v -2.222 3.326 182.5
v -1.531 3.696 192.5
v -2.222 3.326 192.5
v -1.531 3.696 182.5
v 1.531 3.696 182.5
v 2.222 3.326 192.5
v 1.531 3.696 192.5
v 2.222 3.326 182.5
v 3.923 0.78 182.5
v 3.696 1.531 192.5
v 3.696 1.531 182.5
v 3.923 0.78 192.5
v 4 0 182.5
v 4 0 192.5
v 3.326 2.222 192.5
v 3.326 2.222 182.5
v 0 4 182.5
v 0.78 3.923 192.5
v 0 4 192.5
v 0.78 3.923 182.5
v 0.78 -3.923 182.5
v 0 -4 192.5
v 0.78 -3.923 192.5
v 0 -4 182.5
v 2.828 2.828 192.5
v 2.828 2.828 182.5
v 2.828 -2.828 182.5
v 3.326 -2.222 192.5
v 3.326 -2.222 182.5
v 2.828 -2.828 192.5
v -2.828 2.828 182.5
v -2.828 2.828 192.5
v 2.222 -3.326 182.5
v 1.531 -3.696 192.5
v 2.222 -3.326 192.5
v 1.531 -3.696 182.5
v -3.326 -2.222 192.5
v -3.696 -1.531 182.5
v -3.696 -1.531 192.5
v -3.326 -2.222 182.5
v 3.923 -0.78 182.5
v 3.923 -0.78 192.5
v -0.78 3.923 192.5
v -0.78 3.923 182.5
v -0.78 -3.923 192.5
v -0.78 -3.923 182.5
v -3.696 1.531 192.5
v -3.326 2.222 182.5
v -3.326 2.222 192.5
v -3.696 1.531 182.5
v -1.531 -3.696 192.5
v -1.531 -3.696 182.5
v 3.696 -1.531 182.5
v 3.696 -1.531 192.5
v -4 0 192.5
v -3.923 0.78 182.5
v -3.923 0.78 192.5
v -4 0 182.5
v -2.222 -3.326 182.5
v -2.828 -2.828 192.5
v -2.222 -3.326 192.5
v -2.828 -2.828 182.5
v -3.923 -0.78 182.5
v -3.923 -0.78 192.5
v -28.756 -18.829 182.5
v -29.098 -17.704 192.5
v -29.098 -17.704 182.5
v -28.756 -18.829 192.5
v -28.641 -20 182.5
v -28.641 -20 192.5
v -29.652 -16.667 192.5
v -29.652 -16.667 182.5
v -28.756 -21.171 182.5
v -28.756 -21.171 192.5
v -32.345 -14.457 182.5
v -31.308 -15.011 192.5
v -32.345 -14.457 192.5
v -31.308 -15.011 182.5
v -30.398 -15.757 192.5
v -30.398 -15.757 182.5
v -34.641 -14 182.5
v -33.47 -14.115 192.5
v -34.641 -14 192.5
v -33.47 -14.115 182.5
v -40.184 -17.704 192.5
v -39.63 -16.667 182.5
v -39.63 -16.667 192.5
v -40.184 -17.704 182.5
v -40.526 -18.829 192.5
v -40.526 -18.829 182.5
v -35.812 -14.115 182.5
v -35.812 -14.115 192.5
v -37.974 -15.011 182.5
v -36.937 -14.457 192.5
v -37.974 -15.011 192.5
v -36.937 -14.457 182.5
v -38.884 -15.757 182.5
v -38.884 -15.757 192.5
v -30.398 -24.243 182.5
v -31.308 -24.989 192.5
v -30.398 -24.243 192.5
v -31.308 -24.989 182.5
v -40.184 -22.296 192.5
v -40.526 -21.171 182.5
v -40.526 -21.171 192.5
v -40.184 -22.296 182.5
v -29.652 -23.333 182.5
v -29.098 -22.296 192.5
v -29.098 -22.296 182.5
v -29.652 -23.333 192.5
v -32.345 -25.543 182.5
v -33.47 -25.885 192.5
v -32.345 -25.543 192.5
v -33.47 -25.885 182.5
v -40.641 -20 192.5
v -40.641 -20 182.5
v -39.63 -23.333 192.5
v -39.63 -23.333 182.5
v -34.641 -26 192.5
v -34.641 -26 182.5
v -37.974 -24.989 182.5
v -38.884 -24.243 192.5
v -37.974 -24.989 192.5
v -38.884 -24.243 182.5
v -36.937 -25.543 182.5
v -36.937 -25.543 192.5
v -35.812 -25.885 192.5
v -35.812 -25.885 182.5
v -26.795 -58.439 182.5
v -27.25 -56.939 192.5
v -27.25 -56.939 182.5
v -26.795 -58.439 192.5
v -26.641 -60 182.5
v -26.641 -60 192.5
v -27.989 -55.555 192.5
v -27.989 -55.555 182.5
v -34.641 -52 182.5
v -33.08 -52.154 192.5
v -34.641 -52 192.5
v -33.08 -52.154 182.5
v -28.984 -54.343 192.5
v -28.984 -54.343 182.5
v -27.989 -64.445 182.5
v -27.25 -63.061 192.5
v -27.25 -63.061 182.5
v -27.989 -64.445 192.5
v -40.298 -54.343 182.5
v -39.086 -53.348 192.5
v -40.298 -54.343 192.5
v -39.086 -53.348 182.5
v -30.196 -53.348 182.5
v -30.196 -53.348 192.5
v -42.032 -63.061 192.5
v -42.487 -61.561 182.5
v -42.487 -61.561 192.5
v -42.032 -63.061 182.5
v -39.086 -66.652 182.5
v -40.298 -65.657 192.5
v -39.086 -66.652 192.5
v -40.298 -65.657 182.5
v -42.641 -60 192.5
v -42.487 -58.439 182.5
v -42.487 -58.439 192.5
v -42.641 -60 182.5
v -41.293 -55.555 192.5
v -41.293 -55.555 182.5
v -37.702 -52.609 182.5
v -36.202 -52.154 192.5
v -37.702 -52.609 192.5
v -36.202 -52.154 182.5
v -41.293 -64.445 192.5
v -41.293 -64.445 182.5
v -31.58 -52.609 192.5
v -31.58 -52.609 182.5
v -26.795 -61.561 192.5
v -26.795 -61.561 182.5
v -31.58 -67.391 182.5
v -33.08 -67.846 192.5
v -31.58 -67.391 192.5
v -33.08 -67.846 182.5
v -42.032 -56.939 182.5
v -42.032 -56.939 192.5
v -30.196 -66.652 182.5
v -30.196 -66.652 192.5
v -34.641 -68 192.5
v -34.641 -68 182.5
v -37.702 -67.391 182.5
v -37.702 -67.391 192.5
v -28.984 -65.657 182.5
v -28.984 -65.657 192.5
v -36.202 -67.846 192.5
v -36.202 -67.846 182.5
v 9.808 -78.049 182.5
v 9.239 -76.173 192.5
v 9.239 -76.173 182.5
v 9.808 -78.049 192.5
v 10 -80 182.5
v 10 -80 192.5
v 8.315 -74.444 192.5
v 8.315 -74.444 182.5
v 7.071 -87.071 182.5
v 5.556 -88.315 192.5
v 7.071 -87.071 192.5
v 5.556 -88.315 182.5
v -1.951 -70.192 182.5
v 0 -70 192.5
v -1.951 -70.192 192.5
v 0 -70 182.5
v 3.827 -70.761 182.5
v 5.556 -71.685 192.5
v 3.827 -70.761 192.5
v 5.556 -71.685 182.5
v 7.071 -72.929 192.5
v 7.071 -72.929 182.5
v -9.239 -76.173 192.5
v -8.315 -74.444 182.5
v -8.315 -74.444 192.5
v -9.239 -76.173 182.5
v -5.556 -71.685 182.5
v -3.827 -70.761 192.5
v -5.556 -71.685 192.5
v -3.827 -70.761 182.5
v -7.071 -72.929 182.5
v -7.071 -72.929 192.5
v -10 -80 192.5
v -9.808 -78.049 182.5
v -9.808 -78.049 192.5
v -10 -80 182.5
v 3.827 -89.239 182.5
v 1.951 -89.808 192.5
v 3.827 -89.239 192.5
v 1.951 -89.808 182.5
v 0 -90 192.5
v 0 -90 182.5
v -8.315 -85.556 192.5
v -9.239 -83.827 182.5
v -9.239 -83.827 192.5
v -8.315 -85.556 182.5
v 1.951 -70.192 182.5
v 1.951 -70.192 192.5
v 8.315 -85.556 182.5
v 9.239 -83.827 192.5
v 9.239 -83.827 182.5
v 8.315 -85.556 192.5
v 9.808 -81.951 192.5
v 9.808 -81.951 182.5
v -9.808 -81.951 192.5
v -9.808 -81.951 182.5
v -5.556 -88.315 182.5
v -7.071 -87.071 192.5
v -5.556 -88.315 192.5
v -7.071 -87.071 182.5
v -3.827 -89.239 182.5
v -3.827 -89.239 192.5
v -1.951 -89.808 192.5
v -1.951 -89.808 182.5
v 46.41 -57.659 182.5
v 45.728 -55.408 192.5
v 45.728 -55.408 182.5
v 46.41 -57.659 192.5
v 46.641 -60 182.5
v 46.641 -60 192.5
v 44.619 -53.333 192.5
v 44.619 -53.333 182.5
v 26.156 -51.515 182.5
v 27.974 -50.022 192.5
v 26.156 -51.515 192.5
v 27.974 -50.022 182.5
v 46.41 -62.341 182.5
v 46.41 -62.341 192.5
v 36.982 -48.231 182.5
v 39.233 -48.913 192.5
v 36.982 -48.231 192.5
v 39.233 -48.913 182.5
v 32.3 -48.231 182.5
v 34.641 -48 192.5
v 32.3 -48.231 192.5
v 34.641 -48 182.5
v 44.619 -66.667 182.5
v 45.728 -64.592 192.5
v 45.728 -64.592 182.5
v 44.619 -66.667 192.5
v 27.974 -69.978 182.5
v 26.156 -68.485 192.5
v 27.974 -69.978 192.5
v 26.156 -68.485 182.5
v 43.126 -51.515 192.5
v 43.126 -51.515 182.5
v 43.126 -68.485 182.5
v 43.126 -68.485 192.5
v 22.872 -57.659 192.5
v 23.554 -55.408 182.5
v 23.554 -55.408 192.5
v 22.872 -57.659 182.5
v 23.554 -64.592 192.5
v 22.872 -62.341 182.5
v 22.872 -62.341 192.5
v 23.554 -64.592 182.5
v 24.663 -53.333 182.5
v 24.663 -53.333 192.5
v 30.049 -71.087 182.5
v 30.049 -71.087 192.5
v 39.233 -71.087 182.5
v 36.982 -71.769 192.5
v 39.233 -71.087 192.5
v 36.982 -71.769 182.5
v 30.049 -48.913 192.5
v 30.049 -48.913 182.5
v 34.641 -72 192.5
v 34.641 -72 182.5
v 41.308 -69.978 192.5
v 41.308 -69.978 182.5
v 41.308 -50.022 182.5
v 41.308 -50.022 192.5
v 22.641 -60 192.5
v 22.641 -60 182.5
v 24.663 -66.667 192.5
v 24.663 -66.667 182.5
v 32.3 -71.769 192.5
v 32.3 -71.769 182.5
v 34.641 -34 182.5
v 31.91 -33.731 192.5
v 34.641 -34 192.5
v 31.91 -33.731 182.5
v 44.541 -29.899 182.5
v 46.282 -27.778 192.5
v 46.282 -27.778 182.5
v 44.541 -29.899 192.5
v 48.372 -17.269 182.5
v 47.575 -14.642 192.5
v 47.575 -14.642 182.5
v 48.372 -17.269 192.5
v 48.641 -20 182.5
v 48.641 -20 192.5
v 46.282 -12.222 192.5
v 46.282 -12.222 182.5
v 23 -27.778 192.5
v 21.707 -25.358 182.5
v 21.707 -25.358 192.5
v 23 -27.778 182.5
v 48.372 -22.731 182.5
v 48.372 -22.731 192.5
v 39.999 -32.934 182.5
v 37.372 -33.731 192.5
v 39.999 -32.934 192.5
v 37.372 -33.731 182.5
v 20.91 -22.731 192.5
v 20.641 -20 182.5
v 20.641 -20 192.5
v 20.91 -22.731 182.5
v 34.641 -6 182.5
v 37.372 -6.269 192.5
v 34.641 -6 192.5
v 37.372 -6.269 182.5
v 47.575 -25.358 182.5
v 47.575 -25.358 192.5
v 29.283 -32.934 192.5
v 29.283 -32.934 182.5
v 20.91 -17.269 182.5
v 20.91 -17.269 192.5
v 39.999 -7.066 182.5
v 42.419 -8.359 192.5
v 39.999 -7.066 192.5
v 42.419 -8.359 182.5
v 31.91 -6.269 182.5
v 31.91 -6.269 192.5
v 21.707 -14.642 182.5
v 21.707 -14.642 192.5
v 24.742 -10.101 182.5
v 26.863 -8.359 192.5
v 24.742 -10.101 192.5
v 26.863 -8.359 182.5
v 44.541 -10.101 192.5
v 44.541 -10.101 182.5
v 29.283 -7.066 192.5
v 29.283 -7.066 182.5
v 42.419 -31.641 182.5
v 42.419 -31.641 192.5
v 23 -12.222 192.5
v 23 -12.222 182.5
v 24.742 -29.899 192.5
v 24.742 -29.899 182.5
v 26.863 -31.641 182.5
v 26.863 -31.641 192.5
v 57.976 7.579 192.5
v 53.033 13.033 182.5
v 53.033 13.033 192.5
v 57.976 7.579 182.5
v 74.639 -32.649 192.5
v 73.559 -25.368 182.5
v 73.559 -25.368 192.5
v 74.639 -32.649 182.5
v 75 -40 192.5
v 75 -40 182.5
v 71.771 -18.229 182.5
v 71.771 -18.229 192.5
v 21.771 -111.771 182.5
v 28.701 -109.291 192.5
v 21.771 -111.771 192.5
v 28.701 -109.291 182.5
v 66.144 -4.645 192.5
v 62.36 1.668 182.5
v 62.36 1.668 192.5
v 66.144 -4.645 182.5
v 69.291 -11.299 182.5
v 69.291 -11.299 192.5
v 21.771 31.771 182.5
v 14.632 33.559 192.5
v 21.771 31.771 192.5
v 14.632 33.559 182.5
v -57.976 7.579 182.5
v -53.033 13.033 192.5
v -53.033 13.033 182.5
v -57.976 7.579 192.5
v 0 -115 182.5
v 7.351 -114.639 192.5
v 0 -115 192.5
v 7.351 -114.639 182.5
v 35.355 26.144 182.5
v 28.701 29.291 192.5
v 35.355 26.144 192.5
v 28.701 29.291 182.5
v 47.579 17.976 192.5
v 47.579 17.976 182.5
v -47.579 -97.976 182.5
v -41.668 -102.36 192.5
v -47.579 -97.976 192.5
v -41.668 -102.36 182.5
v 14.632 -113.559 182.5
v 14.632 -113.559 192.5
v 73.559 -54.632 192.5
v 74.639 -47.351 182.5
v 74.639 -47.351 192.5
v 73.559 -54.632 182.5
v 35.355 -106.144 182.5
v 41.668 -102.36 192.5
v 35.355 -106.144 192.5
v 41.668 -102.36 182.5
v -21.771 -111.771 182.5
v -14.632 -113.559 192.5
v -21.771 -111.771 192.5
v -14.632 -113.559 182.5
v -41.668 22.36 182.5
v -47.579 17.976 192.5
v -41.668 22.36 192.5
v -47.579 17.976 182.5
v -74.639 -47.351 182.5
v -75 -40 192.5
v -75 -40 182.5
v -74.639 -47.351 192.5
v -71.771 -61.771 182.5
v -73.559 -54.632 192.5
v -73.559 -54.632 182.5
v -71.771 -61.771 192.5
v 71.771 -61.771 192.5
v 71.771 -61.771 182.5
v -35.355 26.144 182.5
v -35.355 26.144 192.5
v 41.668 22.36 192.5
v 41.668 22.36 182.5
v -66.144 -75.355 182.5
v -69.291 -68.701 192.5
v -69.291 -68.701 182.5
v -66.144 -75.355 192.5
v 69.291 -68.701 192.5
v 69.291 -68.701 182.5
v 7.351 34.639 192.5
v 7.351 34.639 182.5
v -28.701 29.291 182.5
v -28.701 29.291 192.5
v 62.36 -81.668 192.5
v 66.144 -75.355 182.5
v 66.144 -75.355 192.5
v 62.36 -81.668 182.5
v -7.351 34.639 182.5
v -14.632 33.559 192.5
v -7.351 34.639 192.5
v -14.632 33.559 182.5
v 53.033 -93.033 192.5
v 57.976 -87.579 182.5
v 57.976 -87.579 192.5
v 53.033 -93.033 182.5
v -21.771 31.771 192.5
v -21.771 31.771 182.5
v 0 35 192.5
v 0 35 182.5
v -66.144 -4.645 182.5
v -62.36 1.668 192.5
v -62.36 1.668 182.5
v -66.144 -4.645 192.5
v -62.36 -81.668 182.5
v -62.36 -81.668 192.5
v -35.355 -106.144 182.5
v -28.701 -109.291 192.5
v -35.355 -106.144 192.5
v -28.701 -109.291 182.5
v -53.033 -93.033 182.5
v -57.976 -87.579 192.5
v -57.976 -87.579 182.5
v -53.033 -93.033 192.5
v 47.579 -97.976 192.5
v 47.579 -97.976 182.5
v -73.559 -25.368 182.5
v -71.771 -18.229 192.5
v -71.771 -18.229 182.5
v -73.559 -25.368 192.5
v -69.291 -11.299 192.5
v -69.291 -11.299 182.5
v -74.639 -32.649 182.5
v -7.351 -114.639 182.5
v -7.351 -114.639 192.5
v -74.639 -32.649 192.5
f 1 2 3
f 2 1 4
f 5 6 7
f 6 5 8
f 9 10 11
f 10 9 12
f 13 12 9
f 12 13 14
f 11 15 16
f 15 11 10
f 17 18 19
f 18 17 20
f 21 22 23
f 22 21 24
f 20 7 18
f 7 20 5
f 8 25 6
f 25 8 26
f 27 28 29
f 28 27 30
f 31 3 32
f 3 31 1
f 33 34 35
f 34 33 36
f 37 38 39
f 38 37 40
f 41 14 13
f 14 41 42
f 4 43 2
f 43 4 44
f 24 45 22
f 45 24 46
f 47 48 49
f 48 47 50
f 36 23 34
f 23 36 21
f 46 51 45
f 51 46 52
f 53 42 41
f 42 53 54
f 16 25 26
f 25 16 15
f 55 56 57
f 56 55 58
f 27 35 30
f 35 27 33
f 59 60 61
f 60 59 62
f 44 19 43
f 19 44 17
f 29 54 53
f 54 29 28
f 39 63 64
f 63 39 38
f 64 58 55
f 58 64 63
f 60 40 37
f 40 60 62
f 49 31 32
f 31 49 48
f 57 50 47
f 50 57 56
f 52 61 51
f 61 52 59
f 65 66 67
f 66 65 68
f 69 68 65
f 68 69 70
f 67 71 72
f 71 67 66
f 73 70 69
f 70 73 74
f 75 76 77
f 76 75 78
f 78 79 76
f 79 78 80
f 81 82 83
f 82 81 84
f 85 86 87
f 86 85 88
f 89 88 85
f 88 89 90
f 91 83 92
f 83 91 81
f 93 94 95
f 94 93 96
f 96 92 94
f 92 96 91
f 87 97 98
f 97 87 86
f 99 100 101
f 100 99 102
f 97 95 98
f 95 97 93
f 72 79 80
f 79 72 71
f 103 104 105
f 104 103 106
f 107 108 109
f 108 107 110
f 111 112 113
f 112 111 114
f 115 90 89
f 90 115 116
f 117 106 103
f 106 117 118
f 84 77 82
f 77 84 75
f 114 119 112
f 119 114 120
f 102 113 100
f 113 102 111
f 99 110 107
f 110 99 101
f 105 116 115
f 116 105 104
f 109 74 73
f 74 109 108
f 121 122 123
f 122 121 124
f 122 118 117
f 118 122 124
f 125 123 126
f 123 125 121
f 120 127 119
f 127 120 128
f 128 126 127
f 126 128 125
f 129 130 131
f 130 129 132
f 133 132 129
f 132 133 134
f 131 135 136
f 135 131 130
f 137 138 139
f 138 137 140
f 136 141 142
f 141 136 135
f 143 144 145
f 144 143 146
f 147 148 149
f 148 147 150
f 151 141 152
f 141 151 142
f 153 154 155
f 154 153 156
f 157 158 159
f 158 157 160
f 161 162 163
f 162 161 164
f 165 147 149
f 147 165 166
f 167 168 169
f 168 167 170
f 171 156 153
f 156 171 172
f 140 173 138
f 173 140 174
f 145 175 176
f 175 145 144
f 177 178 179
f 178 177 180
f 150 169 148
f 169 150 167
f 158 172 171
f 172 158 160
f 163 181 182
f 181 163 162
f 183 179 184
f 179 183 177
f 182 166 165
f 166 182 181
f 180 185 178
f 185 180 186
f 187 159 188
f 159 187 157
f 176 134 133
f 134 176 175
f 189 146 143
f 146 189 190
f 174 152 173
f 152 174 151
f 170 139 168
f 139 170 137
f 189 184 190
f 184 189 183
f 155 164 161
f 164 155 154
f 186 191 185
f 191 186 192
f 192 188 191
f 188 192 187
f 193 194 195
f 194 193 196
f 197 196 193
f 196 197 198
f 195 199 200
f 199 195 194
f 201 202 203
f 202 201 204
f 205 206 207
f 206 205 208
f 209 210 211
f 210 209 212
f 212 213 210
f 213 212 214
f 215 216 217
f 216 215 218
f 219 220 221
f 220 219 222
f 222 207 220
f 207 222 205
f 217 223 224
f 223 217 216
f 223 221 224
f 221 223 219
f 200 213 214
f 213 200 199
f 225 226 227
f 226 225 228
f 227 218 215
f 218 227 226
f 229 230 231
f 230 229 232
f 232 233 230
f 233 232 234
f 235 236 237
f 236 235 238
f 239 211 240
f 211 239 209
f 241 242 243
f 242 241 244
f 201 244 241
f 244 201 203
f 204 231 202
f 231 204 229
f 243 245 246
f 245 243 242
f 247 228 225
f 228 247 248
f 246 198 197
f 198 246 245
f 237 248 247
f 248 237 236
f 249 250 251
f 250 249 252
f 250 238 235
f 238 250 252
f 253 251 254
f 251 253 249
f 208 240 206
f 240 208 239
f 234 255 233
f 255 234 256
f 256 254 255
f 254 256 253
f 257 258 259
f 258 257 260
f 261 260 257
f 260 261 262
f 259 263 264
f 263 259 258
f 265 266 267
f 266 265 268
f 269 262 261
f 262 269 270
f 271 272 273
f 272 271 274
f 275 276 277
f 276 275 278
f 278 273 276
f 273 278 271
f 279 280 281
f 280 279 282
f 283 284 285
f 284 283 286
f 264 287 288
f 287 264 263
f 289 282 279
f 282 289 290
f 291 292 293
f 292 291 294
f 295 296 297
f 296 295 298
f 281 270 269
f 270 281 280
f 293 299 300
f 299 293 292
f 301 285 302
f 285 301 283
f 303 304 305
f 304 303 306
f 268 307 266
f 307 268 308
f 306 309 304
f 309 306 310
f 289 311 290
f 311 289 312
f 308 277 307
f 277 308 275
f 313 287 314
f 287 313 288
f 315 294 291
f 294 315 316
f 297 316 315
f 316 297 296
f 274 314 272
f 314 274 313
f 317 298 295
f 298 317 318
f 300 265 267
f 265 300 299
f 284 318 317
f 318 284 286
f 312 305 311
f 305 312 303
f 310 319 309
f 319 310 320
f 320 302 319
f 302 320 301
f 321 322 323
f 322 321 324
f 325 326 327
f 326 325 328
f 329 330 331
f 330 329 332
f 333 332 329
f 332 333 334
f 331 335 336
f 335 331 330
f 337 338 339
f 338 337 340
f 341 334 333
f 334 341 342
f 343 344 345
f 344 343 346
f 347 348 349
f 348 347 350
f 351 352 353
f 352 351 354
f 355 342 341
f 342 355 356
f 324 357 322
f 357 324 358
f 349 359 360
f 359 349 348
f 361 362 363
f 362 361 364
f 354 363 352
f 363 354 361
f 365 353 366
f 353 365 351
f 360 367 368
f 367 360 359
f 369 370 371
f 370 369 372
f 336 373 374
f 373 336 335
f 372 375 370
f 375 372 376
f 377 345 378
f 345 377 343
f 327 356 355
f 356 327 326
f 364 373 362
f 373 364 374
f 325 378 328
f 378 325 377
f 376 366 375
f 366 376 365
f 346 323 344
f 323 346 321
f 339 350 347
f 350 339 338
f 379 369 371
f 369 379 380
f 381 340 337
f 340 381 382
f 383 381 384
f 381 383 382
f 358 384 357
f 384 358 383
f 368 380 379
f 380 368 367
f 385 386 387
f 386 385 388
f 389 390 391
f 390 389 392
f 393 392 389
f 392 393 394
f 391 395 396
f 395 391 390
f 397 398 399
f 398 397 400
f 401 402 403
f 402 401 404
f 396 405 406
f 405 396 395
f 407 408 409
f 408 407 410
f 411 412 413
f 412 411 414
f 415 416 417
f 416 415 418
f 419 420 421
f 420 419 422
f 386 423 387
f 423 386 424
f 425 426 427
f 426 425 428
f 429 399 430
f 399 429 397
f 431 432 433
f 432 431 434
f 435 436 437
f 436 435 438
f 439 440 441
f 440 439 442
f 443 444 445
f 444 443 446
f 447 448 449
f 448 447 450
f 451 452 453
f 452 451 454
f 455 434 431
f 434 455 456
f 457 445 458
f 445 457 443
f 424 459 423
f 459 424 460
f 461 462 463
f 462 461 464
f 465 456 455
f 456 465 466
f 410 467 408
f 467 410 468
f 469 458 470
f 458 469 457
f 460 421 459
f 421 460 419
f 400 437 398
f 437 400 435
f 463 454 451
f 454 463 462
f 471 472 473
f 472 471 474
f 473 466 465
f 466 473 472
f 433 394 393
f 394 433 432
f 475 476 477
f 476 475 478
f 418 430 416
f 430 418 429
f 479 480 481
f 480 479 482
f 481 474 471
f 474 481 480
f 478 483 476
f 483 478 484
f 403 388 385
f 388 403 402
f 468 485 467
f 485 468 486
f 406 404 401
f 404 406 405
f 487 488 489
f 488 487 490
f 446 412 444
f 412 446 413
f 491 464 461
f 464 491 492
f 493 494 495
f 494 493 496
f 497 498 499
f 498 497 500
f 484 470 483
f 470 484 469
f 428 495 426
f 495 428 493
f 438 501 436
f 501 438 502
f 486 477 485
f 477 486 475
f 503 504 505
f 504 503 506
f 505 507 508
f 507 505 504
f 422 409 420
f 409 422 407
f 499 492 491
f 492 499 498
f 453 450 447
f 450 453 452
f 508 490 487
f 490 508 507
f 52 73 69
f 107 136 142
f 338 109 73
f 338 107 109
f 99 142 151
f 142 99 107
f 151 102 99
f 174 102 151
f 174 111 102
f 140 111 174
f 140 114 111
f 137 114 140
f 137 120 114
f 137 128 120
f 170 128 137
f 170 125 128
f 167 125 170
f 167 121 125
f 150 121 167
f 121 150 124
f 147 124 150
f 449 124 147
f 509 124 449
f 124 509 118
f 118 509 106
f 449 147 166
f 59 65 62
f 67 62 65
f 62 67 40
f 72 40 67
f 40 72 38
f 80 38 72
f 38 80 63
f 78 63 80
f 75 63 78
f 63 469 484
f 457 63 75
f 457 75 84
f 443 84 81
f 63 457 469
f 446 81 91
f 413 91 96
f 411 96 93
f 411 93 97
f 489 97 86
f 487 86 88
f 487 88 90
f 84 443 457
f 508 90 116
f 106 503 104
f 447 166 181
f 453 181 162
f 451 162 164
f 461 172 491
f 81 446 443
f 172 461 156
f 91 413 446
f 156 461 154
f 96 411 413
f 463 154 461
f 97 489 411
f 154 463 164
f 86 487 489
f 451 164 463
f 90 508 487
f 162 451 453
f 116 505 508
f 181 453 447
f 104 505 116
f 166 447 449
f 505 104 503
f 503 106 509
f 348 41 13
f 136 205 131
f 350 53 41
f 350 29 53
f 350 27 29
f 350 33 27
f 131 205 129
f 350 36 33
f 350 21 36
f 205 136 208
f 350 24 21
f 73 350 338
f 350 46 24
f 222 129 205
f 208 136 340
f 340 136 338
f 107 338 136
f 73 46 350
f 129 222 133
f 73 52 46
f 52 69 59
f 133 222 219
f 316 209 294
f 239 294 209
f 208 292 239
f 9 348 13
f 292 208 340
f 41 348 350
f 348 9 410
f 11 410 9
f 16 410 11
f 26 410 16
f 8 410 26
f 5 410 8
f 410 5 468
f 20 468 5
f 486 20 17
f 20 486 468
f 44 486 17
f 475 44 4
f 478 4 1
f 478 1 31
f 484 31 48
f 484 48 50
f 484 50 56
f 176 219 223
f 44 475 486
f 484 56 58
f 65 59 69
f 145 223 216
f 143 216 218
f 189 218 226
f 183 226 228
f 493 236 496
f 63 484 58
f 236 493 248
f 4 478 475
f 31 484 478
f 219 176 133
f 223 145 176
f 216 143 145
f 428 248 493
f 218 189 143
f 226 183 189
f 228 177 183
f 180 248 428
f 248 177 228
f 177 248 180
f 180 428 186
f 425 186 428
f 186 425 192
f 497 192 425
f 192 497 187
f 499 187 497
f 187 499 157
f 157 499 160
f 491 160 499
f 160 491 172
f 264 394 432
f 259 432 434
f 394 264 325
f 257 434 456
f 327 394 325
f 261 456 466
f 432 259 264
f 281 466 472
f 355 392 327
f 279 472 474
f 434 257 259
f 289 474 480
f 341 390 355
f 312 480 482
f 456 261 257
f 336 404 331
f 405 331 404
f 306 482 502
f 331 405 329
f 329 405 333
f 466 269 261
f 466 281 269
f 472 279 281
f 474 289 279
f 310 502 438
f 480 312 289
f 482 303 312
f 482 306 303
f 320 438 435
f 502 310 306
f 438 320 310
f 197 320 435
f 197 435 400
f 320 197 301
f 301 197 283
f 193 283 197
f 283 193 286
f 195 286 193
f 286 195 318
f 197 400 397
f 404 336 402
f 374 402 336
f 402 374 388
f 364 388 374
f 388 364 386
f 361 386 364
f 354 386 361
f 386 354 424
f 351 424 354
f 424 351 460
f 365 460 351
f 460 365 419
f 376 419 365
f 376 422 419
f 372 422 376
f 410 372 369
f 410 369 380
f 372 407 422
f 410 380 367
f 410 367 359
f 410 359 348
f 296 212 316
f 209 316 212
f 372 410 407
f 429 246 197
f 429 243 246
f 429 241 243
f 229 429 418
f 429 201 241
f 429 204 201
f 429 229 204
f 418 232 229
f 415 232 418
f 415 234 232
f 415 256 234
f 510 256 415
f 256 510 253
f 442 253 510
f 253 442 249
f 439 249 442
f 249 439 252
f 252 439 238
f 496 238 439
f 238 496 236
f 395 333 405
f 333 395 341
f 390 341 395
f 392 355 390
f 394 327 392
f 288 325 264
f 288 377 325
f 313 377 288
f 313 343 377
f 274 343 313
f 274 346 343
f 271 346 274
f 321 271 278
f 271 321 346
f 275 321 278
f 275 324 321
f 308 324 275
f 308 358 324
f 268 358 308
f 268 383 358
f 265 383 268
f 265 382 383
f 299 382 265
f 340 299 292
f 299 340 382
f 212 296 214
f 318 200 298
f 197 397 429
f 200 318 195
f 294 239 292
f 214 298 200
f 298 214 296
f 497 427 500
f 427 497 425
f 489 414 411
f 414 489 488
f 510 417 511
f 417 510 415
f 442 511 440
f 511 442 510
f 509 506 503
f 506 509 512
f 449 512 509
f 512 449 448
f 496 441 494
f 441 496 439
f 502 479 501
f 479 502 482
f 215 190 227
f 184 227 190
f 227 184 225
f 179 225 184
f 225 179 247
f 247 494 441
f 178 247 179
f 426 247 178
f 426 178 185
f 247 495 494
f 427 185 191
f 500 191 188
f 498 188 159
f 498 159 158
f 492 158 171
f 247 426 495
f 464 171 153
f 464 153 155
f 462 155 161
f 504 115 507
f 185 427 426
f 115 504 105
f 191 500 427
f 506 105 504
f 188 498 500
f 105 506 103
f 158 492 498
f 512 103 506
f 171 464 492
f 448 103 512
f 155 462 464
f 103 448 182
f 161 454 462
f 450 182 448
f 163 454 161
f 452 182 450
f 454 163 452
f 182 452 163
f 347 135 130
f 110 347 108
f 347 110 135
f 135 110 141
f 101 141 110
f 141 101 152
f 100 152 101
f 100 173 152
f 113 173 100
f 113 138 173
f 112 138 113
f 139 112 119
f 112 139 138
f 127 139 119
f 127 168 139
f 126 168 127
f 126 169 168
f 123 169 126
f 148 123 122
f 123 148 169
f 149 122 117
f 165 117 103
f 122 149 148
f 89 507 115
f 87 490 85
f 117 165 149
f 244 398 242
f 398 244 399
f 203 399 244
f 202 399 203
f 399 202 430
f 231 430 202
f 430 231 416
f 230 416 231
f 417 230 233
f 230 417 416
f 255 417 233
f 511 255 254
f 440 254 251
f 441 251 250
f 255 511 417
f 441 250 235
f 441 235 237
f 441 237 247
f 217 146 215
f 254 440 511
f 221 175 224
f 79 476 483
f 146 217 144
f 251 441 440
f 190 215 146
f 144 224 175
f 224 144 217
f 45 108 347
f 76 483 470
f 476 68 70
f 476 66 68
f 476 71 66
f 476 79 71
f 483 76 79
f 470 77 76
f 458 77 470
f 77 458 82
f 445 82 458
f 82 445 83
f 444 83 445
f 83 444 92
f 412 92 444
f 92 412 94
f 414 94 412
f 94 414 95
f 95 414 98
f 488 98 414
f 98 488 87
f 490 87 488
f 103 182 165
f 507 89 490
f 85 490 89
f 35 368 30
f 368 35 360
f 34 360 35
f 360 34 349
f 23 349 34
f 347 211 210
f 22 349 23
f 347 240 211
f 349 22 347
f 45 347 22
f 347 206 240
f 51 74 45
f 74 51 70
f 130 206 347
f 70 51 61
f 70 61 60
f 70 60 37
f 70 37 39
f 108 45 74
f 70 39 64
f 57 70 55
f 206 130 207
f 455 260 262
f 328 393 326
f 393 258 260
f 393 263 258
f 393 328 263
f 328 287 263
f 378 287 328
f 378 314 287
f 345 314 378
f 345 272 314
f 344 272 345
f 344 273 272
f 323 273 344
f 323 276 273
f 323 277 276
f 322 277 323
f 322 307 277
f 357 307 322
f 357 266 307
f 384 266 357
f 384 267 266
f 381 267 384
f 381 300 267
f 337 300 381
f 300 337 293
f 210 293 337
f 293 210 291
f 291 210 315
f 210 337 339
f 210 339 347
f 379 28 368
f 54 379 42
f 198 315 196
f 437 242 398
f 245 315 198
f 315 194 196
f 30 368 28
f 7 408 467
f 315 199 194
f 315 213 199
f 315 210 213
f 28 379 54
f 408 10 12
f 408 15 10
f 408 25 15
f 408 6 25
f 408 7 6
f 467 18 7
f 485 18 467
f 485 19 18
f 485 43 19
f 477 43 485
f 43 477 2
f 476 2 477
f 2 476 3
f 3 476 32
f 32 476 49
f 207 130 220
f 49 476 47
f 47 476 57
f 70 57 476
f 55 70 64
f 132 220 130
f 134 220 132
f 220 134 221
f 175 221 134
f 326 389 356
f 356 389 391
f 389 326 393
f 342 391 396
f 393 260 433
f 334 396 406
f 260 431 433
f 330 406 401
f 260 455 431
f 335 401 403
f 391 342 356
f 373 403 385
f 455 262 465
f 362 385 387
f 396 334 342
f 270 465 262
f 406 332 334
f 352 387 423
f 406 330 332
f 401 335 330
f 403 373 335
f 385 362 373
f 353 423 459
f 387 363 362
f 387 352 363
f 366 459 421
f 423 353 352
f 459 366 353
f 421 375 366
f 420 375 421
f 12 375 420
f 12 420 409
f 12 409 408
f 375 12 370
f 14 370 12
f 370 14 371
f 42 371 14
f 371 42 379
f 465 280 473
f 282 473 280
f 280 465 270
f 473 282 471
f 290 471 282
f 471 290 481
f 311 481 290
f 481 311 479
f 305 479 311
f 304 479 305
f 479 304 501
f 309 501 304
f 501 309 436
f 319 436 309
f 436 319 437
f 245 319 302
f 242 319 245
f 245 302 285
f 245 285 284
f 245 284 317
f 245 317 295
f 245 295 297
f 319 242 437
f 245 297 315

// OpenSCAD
// 顯微鏡模型 - 根據三視圖
// 單位：微米 (μm)

// 總體參數
base_l = 380;
base_w = 240;
base_h = 50;
base_chamfer = 10;

main_body_l = 100;
main_body_w = 80 ;
main_body_h = 300;

arm_h = 100;
arm_r = 20;

main_body_base_l = 100;
main_body_base_w = 80;
main_body_base_h = 100;

// 物鏡 
lens_r = 15;
lens_l = [55, 70, 85];

    
dist_z = 30;
dist_x = 25;  

turret_h = 40;
turret_r = 70;

// 載物臺
stage_z = 200;
stage_l = 200;
stage_w = 200;
stage_h = 15;
stage_hole_r = 12;
stage_base_l = 20;
stage_base_w = 55;
stage_base_h = 60;

// 光圈
disk_r = 75;
disk_y_offset = -40;
aperture_holes = [4, 6, 8, 10, 12, 14];
disk_h = 10;

// 粗調節輪
big_knob_r = 50;
big_knob_h = 40;
knob_z = 150;

// 細調節輪
small_knob_r = 30;
small_knob_h = 20;

// 目鏡
eyepiece_tube_h = 200;
eyepiece_diameter = 30;

// 光源
light_tube_r = 50;
light_tube_h = 30;
light_hole_r = 35;




$fn = 100; // 圓形和圓柱體的細節度

// 主模組
module microscope() {
    /*
    base();
    main_body();    


    objective_lenses();    



    stage();    
    */
    aperture_disk();
    /*
    big_knob();
    small_knob();

    
    eyepiece();
    eyepiece_base();
    

    light_stage();
    light_source();
    */

}

// 底部
module base() {
    union() {
        translate([0, 0, base_h/2]) {
            cube([base_l, base_w, base_h], center=true);
            };
        difference(){
            translate([0, 0, base_h + light_tube_h/2]) {
                cylinder(h = light_tube_h, r = light_tube_r,  center=true);}
            translate([0, 0, base_h + light_tube_h/2]) {
                cylinder(h = light_tube_h+1, r = light_hole_r,  center=true);}                
        }

    }
}
module light_stage(){
       
    translate([0,0,stage_z]){
        cylinder(h=stage_h, r=stage_hole_r, $fn=64, center=true);
    }       

}

module light_source(){
    translate([0, 0, base_h + light_tube_h/2-5]) cylinder(h = light_tube_h, r = light_hole_r,  center=true);
    }

// 主體支架和鏡臂
module main_body() {
    

    translate([base_l/2 - main_body_l/2, 0, base_h + main_body_h/2]) {
        cube([main_body_l, main_body_w, main_body_h], center=true);
    }

   
    z1 = base_h + main_body_h + arm_h;
    z2 = base_h + main_body_h;
    // 鏡臂曲線部分
    hull() {
        translate([0, 0, z1]) {
            cube([main_body_l, main_body_w, 1], center=true);
            //cylinder(h=arm_h, r=arm_r, center=true);
        }
        
        translate([base_l/2 - main_body_l/2, 0, z2]) {
            cube([main_body_l, main_body_w, 1], center=true);            
            //cylinder(h=arm_h, r=arm_r, center=true);
        }
        
    }

    // 主體底座
    translate([-main_body_base_l/2 + main_body_l/2 , 0, base_h + main_body_h + arm_h - main_body_base_h/2 ]) {
        cube([main_body_base_l, main_body_base_w, main_body_base_h], center=true);
    }

}
// 物鏡
module objective_lenses( R=30) {
    //鼻輪角度
    angle = 45;
    base_z = base_h + main_body_h;
    
  

    translate([-dist_x,0,base_z])
    union(){
        rotate(a=angle, v=[0,1,0])
            cylinder(h = turret_h, r = turret_r, center=true);
        
        // 物鏡旋轉時 物鏡的旋轉圓心距離物鏡頂部距離
        n = len(lens_l);    
        for (i = [0:n-1]){
            angle = 360*i/n;
            rotate(a = angle, v = [-1,0,-1])
            translate([dist_x,0,-(lens_l[i]/2 + dist_z)])    
            cylinder(h=lens_l[i], r=lens_r, center=true);
        }
    }

    



    
}

// -------- 自訂點積函數 --------
function dot(v1, v2) = v1[0]*v2[0] + v1[1]*v2[1] + v1[2]*v2[2];

// -------- 工具函數：把向量 v 依照 axis 旋轉 a 度 --------
function rotate_vector(v, a, axis) =
    let(
        u = axis / norm(axis),               // 單位化軸
        cosA = cos(a),
        sinA = sin(a)
    )
    v*cosA + cross(u,v)*sinA + u*dot(u,v)*(1-cosA);


// 物鏡
module objective_lenses2( R=30) {
    n = len(lens_l);
    base_z = base_h + main_body_h;

    // ---- Step1: 計算第0支物鏡的朝向 ----
    v0 = [R, 0, -lens_l[0]];

    // 角度
    a = acos( v0[2]*(-1) / norm(v0) );   // dot(v0,[0,0,-1]) 簡化成 v0[2]*(-1)
    axis = cross(v0, [0,0,-1]); // 旋轉校正軸
    echo(str("校正軸 = ", axis));
    echo(str("angle = ", a));


    // Step2: 算出鼻輪旋轉軸 (原本是 [0,0,1]，旋轉後的方向)
    turret_axis = rotate_vector([0,0,1], a, axis);
    echo(str("鼻輪旋轉軸 = ", turret_axis));


    // ---- Step2: 先把第0支對準 -z，再平移到原點 ----
    translate([-25,0,base_z])   // 這裡用 -R，保證第0支在 x=0
    rotate(a=a, v=axis)
    for (i = [0:n-1]) {
        angle = 360*i/n;
        x = R * cos(angle);
        y = R * sin(angle);
        lens_l = lens_l[i];

        translate([x,y,0]) {
            lookat = [x, y, -lens_l];
            rotate(a=acos(lookat[2]/norm(lookat)),
                   v=[-lookat[1], lookat[0], 0])
                cylinder(h=lens_l, r=lens_r, center=false);
        }
    }

    translate([-25, 0, base_z]) {
        rotate(a=a, v=axis)
            cylinder(h = turret_h, r = turret_r, center=true);
    }
    
}


// 載物台
module stage() {    
    // 台子
    difference() {
        translate([0, 0, stage_z]) {
            cube([stage_l, stage_w, stage_h], center=true);
        }
        translate([0,0,stage_z]){
            cylinder(h=stage_h+2, r=stage_hole_r, $fn=64, center=true);
        }    
    }
    
    
    // 台子基座
    translate([stage_l/2 - stage_base_l/2, 0, stage_z - stage_h/2 -  stage_base_h/2 ]) {
        cube([stage_base_l, stage_base_w, stage_base_h], center=true);
    }
}

// 光圈圓盤
module aperture_disk() {
    disk_z = stage_z - stage_h/2- disk_h/2;
    center = [0,disk_y_offset,disk_z];


    difference() {
        translate(center) 
            cylinder(h = disk_h, r = disk_r, $fn=64, center=true);
        for(i=[0:5]) {
            angle = i*360 / len(aperture_holes) + 90;
            //length = disk_r - 5 - max(aperture_holes);
            length = -center[1];
            r_hole = aperture_holes[i];
            x = center[0] + cos(angle)*length;
            y = center[1] + sin(angle)*length;
            translate([x, y, disk_z])
                cylinder(h=disk_h+3, r=r_hole, $fn=32, center=true);
        }
    }

}


// 粗調節輪（側面淺孔版）
module big_knob() {
    knob_x = base_l/2 - main_body_l/2;
    knob_y = main_body_w/2 + big_knob_h/2 ;
    knob_depth = big_knob_h / 5 ; // 圓孔深度
    hole_r = big_knob_r / 6;     // 圓孔半徑
    offset = big_knob_r - hole_r - 4; // 側面孔距離旋鈕中心
    

    union(){
        translate([knob_x, knob_y, knob_z]) {
            rotate([90, 0, 0]) { // 將孔旋轉到側面
                difference(){                
                    cylinder(h=big_knob_h, r=big_knob_r, center=true);
                    // 側面淺孔
                    translate([0, offset, -big_knob_h/2])
                        cylinder(h=knob_depth, r=hole_r, center=true);
                }
            }
        }

        translate([knob_x, -knob_y, knob_z]) {
            rotate([90, 0, 0]) {
                difference(){
                    cylinder(h=big_knob_h, r=big_knob_r, center=true);
                    // 側面淺孔
                    translate([0, offset, big_knob_h/2])
                        cylinder(h=knob_depth, r=hole_r, center=true);
                }
            }
        }    
    }
}

// 細調節輪
module small_knob() {
    knob_x = base_l/2 - main_body_l/2;
    knob_y = main_body_w/2 + big_knob_h + small_knob_h/2;
    knob_depth = small_knob_h / 5 ; // 圓孔深度
    hole_r = small_knob_r / 6;     // 圓孔半徑
    offset = small_knob_r - hole_r - 5; // 側面孔距離旋鈕中心
    

    union(){
        translate([knob_x, knob_y, knob_z]) {
            rotate([90, 0, 0]) { // 將孔旋轉到側面
                difference(){                
                    cylinder(h=small_knob_h, r=small_knob_r, center=true);
                    // 側面淺孔
                    translate([0, offset, -small_knob_h/2])
                        cylinder(h=knob_depth, r=hole_r, center=true);
                }
            }
        }

        translate([knob_x, -knob_y, knob_z]) {
            rotate([90, 0, 0]) {
                difference(){
                    cylinder(h=small_knob_h, r=small_knob_r, center=true);
                    // 側面淺孔
                    translate([0, offset, small_knob_h/2])
                        cylinder(h=knob_depth, r=hole_r, center=true);
                }
            }
        }    
    }
}
// 目鏡
module eyepiece() {
    angle = 45;
    eyepiece_z = base_h + main_body_h + arm_h + eyepiece_tube_h*sin(angle);


    // 先算目鏡底部位置
    base_pos = [-eyepiece_tube_h*sin(angle)+40, 0, base_h + main_body_h + arm_h + 100];

    
    translate(base_pos) {
        rotate([0,-angle,0]){
            cylinder(h=eyepiece_tube_h, r=eyepiece_diameter, center=true);
        }
    }

}

// 目鏡底座
module eyepiece_base(){
    angle = 45;
    base_pos = [-eyepiece_tube_h*sin(angle)+90, 0, base_h + main_body_h + arm_h +50];
    z2 = base_h + main_body_h + arm_h+10;    


    hull() {
    translate(base_pos) {
        rotate([0, -angle, 0]) {
            cylinder(h=10, r=40, center=true);
        }
    }
    

    translate([0, 0, z2]) {
        cylinder(h=20, r=40, center=true);
        //cylinder(h=arm_h, r=arm_r, center=true);
    }
}
    

}
// 渲染顯微鏡
microscope();
